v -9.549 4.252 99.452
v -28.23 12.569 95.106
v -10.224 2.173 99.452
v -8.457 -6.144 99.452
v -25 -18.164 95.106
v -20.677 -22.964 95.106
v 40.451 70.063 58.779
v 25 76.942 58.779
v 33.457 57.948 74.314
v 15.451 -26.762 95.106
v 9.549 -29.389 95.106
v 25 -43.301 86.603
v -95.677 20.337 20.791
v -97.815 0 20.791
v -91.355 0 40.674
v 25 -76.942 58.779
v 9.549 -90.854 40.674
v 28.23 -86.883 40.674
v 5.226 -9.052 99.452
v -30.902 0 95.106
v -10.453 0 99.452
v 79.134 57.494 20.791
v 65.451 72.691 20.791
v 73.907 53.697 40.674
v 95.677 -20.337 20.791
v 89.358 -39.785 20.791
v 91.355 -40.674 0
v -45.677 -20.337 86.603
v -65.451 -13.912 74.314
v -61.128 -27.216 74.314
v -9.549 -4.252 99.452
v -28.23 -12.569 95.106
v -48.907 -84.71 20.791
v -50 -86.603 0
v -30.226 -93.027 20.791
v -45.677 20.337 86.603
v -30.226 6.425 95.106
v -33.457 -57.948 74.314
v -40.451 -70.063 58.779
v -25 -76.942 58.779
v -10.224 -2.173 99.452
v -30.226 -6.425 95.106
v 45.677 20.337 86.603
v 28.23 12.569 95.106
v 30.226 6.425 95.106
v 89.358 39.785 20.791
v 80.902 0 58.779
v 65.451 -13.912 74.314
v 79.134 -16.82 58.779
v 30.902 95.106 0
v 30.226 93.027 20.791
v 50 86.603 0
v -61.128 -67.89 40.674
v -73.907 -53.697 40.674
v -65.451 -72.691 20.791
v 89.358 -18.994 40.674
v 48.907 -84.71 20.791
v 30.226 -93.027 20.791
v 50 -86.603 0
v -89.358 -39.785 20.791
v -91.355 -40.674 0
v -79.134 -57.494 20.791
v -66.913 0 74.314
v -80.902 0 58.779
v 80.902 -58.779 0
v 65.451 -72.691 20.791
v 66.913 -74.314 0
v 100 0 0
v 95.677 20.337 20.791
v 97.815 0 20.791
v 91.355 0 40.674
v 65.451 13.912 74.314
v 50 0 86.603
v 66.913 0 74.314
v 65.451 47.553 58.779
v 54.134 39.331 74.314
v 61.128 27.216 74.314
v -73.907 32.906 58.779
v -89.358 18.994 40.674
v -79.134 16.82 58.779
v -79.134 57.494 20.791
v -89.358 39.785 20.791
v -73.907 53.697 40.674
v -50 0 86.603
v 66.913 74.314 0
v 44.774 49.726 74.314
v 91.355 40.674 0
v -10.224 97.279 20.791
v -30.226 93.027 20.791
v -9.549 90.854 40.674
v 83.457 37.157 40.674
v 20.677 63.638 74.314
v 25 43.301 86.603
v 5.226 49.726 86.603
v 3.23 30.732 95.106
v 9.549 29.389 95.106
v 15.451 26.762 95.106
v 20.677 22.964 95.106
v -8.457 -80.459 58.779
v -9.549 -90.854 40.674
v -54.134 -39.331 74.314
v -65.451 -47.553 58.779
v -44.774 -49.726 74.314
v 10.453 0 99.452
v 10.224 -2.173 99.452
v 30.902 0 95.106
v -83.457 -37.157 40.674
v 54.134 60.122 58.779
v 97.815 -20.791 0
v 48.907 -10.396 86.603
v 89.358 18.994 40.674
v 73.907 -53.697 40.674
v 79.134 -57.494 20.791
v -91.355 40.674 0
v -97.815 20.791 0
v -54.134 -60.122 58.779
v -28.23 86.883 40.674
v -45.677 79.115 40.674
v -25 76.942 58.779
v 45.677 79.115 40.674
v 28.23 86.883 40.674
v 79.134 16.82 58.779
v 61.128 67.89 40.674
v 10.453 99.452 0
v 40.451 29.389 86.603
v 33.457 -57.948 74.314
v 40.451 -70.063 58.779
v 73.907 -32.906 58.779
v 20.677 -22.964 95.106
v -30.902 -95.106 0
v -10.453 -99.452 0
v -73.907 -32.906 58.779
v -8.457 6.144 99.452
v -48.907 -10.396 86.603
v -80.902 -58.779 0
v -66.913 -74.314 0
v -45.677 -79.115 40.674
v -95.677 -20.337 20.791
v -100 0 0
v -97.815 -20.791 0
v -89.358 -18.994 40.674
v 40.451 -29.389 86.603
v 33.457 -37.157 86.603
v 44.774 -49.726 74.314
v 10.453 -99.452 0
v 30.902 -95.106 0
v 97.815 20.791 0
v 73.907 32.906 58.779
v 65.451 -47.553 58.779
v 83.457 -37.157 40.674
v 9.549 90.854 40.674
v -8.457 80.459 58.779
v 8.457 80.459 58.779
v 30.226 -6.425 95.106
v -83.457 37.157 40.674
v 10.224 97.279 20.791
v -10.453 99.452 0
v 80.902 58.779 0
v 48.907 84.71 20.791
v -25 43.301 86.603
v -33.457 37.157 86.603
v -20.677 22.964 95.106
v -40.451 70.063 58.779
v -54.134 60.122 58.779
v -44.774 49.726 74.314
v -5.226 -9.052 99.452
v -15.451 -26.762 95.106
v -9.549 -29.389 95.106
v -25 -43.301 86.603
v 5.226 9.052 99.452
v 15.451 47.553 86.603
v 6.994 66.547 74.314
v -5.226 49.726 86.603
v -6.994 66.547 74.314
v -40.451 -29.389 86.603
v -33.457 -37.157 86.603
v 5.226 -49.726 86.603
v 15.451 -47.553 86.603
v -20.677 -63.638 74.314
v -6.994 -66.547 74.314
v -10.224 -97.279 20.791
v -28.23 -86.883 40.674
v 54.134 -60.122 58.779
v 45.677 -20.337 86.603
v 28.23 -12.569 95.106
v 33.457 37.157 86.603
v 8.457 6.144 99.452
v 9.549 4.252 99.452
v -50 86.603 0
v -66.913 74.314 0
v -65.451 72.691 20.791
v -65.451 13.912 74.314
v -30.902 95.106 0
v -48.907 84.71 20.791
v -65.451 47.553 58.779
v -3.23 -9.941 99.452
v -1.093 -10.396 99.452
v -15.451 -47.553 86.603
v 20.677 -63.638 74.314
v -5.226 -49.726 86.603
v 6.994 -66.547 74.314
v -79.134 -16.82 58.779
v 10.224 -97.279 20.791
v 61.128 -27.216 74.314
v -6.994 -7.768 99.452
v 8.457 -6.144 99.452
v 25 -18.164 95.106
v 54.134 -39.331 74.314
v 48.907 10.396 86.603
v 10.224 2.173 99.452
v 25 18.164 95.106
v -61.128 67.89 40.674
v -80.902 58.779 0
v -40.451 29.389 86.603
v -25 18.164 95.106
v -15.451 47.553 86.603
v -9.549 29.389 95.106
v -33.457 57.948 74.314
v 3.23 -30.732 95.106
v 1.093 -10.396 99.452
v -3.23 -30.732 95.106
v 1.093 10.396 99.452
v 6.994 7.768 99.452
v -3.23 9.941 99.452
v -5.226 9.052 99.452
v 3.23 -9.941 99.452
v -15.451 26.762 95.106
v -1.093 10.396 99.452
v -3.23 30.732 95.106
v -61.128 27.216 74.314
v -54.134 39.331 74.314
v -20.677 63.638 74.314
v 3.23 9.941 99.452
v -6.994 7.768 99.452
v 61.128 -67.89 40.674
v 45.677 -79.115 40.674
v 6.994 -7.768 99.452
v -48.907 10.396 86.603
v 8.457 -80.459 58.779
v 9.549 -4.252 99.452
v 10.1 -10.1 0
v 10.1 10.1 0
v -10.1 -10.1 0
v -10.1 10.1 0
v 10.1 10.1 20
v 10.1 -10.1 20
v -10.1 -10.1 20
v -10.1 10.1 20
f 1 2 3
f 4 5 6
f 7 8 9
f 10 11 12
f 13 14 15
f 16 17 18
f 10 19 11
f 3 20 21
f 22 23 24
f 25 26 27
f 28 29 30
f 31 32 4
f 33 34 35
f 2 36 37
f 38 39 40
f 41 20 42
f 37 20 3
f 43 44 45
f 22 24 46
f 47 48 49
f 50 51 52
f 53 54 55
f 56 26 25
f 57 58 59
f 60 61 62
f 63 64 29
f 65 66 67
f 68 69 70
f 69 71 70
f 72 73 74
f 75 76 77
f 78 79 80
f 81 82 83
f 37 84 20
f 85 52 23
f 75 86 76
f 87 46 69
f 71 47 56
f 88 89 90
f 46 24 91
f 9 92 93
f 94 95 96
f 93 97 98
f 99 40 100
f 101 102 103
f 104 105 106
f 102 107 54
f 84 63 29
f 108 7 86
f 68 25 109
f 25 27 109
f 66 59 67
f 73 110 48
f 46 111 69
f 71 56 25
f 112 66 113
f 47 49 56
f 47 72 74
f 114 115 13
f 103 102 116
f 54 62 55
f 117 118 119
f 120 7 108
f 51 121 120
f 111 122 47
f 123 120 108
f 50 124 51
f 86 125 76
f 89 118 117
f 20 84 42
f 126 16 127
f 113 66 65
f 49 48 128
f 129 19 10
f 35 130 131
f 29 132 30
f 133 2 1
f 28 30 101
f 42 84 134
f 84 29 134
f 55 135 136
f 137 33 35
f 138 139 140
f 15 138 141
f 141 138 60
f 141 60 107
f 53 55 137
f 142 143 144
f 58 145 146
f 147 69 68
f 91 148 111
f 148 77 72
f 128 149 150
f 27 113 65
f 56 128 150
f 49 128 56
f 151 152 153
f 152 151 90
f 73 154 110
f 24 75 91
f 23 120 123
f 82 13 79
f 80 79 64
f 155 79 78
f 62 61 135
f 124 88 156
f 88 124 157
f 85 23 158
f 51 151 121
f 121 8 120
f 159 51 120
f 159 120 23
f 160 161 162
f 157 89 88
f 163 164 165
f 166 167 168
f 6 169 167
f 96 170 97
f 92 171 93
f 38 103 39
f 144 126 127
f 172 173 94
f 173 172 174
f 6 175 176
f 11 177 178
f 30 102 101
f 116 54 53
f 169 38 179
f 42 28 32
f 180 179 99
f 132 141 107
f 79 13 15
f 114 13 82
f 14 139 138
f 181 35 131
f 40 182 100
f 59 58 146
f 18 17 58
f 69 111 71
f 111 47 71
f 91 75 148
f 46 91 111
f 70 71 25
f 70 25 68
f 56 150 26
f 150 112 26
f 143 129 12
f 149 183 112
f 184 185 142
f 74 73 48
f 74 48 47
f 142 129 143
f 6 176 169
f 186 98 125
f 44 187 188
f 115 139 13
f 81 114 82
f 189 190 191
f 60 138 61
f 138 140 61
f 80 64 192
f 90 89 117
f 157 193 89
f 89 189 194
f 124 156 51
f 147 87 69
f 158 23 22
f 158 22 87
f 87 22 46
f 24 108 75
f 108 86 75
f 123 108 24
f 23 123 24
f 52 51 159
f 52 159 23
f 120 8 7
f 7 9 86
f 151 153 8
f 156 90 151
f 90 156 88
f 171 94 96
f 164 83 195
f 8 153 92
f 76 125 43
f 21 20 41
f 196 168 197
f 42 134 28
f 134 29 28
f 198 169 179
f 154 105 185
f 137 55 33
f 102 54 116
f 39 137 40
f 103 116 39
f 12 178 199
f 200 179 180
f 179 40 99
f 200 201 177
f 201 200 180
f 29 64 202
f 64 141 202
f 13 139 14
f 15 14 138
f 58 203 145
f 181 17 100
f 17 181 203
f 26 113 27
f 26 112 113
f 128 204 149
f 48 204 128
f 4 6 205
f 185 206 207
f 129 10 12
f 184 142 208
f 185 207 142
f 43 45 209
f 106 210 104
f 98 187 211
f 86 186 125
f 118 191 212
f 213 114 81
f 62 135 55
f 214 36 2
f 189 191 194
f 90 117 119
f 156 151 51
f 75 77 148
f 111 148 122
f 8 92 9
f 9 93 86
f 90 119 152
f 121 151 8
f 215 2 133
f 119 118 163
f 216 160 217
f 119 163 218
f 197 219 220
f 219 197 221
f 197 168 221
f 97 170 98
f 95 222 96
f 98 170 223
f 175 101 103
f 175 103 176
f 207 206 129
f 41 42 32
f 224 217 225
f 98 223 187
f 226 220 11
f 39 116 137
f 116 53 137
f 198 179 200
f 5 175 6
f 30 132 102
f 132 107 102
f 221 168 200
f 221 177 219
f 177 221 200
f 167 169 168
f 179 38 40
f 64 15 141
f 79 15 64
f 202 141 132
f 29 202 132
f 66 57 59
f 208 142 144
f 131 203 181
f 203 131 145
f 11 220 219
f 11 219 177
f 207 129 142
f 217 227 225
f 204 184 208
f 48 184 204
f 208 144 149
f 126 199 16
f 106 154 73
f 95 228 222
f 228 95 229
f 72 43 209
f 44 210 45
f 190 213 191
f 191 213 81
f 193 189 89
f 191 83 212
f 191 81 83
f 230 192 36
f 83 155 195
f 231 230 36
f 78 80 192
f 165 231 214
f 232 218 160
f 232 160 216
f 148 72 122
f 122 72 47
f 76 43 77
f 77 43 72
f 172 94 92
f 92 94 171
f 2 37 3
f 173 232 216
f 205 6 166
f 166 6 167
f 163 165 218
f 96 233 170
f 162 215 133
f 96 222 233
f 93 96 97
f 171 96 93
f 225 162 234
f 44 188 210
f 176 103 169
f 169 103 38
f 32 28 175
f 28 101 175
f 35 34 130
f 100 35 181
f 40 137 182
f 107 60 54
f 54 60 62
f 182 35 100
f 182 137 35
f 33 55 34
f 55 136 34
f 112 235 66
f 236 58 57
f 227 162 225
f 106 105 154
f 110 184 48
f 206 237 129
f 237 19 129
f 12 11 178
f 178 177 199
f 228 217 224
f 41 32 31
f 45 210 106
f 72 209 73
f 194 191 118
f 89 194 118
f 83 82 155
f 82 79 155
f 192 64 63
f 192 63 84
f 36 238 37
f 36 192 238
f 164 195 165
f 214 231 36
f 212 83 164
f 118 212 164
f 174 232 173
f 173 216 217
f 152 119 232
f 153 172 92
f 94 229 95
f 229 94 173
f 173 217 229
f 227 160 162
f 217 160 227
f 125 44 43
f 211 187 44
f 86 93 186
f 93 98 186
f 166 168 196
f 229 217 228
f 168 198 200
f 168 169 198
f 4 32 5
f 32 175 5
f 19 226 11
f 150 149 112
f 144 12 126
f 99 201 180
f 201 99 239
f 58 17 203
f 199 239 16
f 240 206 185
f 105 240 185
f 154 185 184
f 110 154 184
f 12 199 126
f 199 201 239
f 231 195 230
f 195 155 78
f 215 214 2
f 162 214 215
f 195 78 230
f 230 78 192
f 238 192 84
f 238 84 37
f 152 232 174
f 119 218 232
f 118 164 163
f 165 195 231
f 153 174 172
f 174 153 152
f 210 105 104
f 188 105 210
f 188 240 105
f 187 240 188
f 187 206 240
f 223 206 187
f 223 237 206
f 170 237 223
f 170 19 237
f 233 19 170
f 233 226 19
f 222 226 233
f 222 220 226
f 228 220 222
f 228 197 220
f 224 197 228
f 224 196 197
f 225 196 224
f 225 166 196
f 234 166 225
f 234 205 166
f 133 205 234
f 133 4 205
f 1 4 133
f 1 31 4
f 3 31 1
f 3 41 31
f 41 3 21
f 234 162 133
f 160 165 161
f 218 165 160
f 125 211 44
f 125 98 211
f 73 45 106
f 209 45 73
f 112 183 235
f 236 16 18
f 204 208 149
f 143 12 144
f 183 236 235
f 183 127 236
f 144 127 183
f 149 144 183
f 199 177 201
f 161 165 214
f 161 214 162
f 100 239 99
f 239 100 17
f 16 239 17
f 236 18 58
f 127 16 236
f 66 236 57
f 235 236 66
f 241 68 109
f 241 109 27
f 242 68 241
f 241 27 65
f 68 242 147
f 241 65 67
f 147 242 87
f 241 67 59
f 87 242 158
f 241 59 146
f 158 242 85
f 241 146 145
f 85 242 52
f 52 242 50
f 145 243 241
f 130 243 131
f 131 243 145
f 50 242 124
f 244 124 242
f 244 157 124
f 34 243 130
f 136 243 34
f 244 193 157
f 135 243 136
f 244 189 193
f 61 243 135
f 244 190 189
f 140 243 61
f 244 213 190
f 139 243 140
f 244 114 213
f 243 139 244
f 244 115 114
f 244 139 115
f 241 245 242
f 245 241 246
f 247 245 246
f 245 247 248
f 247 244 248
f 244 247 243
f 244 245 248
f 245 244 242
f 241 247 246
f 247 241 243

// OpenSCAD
radiusSphere=100;
thicknessStand=20;
tolerance=0.2;

difference(){
  sphere(r=radiusSphere);
  translate([0,0,-radiusSphere])cube([2*radiusSphere,2*radiusSphere,2*radiusSphere], true);
  
  //Hole for stand
  translate([0,0,thicknessStand/2])cube([thicknessStand+tolerance,thicknessStand+tolerance,thicknessStand], true);
}
